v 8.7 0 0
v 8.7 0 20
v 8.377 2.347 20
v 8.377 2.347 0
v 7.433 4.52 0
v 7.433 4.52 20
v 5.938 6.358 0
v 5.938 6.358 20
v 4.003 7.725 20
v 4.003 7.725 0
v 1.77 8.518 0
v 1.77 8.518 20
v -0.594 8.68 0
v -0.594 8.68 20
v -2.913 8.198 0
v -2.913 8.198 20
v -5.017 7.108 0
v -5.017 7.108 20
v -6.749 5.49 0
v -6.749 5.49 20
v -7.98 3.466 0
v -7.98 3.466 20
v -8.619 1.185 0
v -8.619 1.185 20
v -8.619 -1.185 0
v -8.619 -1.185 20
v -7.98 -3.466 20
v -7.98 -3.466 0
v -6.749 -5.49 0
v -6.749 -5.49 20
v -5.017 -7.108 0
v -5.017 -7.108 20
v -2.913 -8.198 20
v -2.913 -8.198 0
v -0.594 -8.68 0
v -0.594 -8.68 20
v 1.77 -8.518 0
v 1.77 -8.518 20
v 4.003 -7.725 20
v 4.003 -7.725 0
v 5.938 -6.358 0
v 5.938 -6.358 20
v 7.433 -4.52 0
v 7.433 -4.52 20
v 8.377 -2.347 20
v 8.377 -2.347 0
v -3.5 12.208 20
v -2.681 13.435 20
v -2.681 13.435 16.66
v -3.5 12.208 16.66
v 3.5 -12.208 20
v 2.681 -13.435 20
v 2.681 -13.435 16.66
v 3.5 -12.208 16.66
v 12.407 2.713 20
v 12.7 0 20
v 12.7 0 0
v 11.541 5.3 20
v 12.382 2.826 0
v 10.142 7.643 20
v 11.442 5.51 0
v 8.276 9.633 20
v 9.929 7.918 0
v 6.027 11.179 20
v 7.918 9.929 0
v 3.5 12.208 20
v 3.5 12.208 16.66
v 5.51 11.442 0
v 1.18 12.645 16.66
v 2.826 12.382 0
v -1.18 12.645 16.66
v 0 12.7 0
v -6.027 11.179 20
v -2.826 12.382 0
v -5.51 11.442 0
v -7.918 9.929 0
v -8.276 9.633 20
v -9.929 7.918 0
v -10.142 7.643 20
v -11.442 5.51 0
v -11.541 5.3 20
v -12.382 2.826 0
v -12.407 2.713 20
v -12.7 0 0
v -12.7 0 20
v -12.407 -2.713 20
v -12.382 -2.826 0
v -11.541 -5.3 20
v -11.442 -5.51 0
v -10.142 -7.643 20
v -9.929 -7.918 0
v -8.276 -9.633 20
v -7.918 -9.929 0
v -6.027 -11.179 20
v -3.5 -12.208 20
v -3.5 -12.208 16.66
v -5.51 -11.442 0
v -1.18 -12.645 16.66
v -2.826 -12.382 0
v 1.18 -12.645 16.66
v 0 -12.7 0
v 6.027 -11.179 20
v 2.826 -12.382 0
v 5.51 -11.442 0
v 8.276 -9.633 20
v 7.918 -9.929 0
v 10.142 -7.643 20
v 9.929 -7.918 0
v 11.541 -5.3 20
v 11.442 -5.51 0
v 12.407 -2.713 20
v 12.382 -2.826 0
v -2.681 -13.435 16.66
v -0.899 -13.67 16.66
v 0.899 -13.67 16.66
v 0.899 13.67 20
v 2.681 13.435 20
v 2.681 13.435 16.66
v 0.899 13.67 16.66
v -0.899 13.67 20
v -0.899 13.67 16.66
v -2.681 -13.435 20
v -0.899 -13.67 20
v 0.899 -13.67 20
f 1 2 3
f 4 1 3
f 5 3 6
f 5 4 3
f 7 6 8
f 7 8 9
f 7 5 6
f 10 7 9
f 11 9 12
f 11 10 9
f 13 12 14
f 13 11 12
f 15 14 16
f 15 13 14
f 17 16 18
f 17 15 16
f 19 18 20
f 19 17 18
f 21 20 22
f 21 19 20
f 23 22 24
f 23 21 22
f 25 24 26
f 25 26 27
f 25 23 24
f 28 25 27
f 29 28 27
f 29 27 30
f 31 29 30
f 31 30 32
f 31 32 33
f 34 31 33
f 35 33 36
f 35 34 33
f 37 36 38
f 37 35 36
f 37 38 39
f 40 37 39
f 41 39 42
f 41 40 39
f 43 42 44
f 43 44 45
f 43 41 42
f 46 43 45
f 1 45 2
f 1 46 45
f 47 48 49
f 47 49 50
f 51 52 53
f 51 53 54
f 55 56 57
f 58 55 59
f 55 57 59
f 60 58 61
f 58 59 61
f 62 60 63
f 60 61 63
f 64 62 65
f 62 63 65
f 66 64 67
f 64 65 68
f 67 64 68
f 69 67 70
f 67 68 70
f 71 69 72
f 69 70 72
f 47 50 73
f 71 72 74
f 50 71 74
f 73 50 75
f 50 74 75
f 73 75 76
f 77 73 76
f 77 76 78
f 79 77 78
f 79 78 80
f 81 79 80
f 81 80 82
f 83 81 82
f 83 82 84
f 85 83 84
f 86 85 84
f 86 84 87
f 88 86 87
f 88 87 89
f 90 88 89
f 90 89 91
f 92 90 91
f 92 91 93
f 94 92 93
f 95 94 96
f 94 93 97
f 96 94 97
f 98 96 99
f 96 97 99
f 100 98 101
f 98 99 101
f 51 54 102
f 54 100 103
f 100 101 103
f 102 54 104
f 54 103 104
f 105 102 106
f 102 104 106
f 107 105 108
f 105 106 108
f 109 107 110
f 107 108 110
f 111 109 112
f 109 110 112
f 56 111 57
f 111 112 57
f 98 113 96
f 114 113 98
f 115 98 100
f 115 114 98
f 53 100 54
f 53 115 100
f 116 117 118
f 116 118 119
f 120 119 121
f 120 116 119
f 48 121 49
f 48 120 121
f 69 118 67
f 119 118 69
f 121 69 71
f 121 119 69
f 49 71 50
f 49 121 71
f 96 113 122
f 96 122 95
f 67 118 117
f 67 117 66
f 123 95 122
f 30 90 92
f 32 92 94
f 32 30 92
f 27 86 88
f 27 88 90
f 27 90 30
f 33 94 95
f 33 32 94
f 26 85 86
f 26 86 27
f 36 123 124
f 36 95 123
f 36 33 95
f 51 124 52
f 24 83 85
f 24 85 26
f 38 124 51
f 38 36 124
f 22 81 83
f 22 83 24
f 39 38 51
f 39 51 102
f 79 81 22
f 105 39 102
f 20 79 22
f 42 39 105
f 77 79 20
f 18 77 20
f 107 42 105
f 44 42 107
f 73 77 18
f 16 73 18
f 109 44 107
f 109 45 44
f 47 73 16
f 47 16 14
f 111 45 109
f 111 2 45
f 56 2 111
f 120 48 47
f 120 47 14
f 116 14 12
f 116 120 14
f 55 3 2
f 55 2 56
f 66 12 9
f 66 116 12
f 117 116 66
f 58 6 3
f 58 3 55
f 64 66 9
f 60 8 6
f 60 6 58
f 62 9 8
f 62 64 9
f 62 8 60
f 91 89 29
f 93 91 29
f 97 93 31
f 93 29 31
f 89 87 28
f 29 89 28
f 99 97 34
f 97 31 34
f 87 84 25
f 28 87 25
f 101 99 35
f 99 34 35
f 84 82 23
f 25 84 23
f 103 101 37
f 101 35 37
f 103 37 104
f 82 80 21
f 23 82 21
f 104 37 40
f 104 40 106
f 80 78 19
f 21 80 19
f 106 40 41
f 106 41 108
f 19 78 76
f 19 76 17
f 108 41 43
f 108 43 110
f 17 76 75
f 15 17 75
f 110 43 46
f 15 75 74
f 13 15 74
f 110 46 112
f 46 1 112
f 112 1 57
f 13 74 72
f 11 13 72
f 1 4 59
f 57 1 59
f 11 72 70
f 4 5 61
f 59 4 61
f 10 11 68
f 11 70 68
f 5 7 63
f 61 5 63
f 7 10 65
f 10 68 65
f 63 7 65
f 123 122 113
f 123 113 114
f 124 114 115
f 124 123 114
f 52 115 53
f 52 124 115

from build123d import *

# Parameters (mm, degrees)
SKETCH_R           = 12.7
SKETCH_R_2         = 8.7
PAD_DEPTH          = 20
PAD001_DEPTH       = 3.34
POLARPATTERN_COUNT = 2


with BuildPart() as part:
    # Sketch → Pad (new body)
    with BuildSketch(Plane.XY):
        Circle(SKETCH_R)
        Circle(SKETCH_R_2, mode=Mode.SUBTRACT)
    extrude(amount=PAD_DEPTH)

    # Sketch001 (on Face4 of Pad) → Pad001 (join)
    with BuildSketch(Plane.XY.offset(20)):
        with BuildLine():
            ThreePointArc((3.5, 12.208194), (0, 12.7), (-3.5, 12.208194))
            Line((-2.681395, 13.435033), (-3.5, 12.208194))
            ThreePointArc((2.681395, 13.435033), (0, 13.7), (-2.681395, 13.435033))
            Line((2.681395, 13.435033), (3.5, 12.208194))
        make_face()
    pad001 = extrude(amount=-PAD001_DEPTH)

    # PolarPattern: Pad001 ×2 about axis
    polarpattern_axis = Axis((0, 0, 20), (0, 0, 1))
    for i in range(1, POLARPATTERN_COUNT):
        add(pad001.rotate(polarpattern_axis, i * 360 / POLARPATTERN_COUNT))


solid = part.part
